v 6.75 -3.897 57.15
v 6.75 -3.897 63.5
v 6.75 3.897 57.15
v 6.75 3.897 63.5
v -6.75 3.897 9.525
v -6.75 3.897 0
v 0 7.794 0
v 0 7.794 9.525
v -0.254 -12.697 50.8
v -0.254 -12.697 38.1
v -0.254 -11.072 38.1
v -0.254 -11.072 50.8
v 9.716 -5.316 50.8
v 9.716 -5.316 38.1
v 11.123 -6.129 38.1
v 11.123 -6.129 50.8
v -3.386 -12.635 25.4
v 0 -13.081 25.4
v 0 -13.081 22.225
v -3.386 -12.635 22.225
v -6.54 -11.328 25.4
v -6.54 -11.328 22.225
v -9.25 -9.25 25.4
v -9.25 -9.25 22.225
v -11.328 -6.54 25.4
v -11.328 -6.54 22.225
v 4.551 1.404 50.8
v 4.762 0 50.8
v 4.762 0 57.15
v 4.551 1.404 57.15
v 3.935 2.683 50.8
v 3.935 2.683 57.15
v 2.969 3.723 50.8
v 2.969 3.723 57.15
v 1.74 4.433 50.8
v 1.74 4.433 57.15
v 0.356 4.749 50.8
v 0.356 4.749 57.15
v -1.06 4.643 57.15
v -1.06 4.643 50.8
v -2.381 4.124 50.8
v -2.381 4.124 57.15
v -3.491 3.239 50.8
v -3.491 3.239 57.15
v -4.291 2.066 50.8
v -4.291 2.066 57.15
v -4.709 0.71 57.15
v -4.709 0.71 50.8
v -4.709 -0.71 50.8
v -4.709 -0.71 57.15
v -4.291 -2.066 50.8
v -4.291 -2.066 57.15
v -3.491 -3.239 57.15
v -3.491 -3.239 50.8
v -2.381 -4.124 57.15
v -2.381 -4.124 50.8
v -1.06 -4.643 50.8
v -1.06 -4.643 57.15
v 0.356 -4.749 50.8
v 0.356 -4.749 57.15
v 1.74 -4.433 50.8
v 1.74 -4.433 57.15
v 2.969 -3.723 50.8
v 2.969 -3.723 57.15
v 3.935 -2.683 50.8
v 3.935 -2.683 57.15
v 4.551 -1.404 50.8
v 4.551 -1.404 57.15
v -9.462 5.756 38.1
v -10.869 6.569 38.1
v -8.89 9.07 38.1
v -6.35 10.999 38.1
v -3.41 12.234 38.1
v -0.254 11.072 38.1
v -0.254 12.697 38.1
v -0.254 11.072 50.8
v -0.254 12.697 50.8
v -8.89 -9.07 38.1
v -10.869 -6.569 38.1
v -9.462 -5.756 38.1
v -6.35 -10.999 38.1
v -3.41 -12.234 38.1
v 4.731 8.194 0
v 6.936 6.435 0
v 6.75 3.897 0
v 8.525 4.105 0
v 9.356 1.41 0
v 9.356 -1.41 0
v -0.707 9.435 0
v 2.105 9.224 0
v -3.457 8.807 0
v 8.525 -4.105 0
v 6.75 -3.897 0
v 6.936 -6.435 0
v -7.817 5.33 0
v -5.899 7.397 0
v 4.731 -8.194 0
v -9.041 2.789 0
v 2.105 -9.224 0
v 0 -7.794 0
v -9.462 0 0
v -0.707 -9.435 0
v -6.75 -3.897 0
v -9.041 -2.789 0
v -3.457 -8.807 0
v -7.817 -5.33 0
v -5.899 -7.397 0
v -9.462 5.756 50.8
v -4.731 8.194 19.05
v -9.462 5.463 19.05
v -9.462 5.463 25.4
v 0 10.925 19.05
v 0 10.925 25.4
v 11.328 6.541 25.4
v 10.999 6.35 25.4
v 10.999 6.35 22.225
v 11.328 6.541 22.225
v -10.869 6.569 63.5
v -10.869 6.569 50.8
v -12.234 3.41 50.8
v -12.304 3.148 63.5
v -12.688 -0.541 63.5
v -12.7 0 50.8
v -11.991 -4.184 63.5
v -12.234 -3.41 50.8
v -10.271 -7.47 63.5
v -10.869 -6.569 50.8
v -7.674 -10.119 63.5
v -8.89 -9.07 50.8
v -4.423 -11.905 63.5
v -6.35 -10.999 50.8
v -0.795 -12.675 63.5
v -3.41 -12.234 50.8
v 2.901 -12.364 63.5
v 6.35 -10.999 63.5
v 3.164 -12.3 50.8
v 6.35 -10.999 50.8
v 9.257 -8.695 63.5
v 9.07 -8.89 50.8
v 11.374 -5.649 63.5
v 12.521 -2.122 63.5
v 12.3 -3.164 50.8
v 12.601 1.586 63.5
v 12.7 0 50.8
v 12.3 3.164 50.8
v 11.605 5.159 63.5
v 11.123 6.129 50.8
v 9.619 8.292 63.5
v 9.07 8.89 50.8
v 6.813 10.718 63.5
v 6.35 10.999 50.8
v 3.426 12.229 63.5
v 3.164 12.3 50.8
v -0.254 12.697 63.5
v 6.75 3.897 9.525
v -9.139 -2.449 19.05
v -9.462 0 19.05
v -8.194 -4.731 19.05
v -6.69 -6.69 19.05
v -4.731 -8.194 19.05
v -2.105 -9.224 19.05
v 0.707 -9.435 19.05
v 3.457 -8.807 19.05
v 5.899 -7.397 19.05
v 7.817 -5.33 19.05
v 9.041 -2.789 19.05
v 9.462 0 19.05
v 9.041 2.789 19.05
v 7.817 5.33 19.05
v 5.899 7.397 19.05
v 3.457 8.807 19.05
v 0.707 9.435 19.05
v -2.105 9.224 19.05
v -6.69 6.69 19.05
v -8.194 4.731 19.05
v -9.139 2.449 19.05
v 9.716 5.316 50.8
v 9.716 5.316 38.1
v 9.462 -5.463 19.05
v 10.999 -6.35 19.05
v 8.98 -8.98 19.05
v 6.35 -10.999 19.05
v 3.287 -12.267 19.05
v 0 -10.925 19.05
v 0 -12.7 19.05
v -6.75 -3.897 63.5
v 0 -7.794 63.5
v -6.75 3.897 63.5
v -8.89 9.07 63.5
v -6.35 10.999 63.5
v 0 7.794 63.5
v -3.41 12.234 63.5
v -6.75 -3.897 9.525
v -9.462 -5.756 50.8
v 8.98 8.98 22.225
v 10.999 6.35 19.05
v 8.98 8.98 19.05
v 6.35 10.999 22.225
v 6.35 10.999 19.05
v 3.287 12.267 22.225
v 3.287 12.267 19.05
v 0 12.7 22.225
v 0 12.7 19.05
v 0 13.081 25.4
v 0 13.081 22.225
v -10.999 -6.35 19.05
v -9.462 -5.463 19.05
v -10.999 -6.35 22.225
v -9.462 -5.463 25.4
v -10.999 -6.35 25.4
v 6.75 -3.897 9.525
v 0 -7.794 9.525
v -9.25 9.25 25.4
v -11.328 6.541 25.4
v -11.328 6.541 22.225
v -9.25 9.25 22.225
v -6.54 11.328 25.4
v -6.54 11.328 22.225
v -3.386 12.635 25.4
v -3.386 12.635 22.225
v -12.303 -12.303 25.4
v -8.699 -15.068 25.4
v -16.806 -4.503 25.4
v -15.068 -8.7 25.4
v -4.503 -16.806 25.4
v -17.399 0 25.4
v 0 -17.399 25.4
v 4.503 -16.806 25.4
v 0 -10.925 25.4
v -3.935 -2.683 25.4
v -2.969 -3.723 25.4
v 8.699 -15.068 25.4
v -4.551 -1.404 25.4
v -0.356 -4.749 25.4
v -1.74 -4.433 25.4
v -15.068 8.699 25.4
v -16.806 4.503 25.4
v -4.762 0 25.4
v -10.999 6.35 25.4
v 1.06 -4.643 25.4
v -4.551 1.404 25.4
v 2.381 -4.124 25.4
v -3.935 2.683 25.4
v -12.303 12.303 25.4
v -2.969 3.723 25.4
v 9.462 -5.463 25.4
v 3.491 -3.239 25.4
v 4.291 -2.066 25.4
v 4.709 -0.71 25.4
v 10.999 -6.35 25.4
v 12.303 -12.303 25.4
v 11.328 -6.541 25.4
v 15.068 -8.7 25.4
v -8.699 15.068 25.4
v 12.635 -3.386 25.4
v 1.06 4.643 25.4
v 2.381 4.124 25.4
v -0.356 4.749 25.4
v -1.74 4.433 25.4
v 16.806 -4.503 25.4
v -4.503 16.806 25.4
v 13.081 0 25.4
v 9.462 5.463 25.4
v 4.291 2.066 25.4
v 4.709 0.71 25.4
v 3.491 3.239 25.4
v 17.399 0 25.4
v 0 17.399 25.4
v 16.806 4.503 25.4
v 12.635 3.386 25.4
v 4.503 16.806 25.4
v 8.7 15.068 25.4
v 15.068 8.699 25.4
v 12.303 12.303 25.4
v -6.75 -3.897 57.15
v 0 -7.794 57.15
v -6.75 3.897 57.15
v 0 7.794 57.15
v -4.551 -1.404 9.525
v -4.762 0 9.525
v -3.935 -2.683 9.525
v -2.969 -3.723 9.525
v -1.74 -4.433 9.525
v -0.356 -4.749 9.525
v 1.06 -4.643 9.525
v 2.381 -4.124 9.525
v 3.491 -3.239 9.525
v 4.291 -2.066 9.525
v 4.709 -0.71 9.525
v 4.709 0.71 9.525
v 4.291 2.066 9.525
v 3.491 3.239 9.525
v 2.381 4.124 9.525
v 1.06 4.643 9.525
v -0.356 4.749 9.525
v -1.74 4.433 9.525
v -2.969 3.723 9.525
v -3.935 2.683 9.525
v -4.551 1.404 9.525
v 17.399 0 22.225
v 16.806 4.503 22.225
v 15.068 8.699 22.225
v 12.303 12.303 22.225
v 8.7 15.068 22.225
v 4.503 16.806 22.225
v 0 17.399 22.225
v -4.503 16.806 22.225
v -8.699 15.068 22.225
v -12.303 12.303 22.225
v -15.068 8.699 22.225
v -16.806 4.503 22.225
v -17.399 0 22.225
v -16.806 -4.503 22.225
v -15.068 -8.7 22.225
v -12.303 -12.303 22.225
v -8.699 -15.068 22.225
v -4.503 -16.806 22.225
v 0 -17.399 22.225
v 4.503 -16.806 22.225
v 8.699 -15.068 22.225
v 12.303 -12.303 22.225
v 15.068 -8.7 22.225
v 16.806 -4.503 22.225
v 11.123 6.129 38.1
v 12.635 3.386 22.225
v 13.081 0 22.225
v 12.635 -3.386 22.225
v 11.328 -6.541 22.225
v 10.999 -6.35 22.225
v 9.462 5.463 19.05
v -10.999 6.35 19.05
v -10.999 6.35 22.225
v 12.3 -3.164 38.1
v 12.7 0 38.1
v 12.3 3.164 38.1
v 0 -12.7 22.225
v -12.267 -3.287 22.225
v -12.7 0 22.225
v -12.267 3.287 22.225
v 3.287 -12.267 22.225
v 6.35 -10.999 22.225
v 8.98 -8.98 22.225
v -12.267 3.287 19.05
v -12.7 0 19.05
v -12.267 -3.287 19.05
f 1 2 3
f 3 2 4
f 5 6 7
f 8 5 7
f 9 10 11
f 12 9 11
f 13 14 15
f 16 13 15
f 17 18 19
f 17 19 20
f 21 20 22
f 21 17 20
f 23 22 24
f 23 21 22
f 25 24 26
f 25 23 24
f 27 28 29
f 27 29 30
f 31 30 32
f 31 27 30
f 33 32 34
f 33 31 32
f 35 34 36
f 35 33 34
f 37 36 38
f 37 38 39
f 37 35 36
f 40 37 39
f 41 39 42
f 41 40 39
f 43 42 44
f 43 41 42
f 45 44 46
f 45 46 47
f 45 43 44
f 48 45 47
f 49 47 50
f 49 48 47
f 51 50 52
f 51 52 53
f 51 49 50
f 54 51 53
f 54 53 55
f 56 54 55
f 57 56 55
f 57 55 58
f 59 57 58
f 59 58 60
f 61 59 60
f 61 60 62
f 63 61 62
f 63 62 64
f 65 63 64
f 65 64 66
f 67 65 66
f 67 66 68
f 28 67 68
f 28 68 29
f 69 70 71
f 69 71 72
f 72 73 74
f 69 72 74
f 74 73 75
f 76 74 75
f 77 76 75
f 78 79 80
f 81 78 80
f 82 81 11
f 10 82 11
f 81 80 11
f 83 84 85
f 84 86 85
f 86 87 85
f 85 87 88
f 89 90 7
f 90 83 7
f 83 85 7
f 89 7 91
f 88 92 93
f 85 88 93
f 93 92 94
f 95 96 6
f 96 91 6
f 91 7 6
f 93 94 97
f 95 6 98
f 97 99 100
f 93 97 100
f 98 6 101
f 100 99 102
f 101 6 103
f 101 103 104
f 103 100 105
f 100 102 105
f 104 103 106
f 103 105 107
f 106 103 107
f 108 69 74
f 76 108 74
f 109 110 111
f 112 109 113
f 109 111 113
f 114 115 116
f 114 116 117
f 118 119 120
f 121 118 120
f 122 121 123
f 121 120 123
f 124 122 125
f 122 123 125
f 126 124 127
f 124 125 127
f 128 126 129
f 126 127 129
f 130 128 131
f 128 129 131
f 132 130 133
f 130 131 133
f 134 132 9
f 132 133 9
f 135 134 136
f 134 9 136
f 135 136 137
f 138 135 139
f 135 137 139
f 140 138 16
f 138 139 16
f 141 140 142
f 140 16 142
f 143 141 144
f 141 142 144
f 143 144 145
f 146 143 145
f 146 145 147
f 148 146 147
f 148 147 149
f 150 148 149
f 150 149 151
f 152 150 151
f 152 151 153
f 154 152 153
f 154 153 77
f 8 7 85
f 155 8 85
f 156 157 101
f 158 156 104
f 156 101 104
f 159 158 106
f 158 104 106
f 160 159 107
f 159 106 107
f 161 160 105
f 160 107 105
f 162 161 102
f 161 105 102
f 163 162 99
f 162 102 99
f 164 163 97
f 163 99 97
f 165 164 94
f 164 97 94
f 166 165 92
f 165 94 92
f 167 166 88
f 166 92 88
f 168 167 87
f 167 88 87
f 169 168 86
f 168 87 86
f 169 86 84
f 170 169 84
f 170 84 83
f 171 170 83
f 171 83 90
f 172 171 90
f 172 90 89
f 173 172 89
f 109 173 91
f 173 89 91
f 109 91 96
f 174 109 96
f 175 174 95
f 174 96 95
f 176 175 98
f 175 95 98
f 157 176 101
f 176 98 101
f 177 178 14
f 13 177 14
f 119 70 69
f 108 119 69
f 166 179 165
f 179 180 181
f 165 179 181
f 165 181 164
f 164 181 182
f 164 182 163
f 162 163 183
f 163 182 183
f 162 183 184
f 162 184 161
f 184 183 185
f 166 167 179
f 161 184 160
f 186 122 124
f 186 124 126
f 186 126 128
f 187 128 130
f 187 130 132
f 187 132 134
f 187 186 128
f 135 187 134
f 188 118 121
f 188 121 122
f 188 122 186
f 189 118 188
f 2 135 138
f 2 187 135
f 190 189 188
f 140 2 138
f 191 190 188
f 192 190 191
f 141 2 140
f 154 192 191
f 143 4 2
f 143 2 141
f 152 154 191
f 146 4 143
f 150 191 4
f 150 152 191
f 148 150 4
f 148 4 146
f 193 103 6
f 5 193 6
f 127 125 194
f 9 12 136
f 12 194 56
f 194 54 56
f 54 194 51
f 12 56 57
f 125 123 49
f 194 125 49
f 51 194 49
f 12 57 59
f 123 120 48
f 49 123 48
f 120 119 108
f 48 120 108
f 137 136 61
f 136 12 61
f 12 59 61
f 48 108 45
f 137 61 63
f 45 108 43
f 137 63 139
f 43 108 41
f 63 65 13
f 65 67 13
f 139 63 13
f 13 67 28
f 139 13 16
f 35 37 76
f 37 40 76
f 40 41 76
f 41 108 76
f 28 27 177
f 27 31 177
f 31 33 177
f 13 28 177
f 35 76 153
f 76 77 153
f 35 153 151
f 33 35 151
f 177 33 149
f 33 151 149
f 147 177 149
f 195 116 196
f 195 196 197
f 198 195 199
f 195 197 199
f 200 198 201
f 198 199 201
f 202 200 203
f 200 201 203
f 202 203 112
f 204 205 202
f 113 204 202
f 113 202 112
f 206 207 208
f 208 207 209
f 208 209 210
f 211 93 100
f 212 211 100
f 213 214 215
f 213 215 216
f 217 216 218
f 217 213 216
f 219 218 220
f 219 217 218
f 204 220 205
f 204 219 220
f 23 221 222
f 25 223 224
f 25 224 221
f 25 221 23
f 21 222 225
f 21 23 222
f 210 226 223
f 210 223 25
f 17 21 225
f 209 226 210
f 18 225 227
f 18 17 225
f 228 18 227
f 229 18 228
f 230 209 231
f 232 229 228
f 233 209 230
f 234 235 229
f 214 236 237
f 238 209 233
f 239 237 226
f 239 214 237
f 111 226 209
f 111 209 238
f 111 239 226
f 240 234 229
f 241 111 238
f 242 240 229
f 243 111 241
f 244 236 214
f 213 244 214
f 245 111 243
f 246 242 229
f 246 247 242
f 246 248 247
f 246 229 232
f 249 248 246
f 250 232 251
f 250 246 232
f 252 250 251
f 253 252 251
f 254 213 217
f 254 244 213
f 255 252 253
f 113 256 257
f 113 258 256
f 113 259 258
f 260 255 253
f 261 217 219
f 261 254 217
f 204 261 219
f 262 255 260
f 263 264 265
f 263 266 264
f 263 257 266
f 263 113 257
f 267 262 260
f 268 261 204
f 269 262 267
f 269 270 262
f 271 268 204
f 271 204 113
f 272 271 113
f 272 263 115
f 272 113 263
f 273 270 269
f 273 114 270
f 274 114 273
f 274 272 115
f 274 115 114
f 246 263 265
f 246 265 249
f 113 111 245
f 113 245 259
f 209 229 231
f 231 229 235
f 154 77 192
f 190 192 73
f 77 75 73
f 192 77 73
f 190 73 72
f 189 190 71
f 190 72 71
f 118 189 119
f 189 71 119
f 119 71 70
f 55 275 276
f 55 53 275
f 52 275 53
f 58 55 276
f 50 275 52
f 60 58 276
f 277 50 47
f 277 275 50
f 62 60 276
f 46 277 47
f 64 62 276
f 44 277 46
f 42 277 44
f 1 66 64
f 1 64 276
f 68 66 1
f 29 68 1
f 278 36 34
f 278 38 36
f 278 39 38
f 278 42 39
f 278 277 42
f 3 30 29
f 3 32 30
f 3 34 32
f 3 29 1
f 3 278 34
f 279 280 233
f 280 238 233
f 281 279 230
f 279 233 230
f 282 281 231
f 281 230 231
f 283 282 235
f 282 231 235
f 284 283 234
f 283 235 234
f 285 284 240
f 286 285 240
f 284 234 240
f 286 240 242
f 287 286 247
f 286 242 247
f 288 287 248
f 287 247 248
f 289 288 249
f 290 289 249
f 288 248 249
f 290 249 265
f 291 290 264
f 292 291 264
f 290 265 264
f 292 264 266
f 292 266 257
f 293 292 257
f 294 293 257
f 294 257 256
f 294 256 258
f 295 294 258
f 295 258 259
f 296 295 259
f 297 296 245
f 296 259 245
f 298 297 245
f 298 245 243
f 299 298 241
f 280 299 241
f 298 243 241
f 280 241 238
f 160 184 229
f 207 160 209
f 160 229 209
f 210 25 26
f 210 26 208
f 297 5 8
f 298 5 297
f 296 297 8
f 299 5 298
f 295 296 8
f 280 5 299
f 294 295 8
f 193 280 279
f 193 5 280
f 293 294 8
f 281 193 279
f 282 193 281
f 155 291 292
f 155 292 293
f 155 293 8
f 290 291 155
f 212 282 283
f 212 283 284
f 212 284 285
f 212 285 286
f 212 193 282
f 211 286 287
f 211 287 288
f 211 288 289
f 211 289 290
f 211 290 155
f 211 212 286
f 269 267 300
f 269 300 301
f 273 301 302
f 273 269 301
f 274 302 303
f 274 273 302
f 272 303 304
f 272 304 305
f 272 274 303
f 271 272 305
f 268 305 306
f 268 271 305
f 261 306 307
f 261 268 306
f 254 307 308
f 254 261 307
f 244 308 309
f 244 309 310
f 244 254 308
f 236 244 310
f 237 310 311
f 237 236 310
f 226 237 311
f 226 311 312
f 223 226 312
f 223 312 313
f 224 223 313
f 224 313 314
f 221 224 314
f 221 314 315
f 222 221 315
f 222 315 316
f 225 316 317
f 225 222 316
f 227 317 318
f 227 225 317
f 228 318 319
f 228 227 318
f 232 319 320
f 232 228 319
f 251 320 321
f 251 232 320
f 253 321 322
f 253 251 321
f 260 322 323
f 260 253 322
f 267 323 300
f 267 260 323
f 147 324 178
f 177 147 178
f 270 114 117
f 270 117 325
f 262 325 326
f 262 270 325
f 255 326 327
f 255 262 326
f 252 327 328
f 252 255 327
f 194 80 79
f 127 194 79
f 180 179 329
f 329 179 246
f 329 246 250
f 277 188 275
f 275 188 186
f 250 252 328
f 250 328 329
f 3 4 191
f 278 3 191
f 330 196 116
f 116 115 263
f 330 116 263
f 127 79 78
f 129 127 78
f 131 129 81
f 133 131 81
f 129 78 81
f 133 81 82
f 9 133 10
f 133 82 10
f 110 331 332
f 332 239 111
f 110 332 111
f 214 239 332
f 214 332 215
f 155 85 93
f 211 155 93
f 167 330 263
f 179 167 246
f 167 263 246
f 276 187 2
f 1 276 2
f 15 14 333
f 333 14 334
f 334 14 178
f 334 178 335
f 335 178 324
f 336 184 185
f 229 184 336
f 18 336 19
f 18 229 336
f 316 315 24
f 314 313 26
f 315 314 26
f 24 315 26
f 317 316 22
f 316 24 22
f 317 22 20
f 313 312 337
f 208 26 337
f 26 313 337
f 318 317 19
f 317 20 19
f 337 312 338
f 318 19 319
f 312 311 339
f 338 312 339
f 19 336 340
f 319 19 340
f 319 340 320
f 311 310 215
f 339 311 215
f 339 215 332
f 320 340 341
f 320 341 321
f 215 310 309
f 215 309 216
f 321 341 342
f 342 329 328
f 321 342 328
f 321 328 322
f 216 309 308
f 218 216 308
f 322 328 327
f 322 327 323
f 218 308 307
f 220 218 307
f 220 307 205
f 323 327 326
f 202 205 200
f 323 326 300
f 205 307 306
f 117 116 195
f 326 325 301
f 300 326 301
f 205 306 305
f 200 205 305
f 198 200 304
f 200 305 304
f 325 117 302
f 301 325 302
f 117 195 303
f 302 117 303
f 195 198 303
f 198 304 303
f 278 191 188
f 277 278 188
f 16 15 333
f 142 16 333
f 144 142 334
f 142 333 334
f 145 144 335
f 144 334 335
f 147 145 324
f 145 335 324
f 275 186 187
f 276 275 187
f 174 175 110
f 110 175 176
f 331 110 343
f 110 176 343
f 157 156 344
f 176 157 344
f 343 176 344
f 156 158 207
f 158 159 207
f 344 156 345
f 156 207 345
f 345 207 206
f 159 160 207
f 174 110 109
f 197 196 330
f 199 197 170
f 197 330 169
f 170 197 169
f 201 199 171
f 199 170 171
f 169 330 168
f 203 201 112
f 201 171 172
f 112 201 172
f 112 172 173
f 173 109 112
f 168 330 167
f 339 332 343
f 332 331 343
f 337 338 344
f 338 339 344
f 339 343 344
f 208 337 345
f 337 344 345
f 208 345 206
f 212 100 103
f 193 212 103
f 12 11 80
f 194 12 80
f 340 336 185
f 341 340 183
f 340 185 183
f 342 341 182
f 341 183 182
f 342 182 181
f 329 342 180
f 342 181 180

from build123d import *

# Parameters (mm, degrees)
F2_R      = 4.7625
F3_DEPTH  = 9.525
F5_DEPTH  = 25.4
F8_DEPTH  = 12.7
F9_R      = 4.7625
F10_DEPTH = 12.7
F11_R     = 4.7625
F12_DEPTH = 6.35
F13_R     = 17.399
F14_DEPTH = 3.175


with BuildPart() as f1:
    # F0 (on Front) → F1 (revolve)
    with BuildSketch(Plane.XZ):
        Polygon((-9.4615, 0), (-4.7625, 0), (-4.7625, 6.35), (-4.7625, 25.4), (-12.7, 25.4), (-12.7, 19.05), (-9.4615, 19.05), align=None)
    revolve(axis=Axis((0, 0, 10.2228309714), (0, 0, 1)))

    # F2 (on face) → F3 (cut)
    with BuildSketch(Plane(origin=(0, 0, 0), x_dir=(1, 0, 0), z_dir=(0, 0, -1))):
        Polygon((6.75, -3.897114317), (6.75, 3.897114317), (0, 7.7942286341), (-6.75, 3.897114317), (-6.75, -3.897114317), (0, -7.7942286341), align=None)
        Circle(F2_R, mode=Mode.SUBTRACT)
    extrude(amount=-F3_DEPTH, mode=Mode.SUBTRACT)

    # F4 (on face) → F5 (cut)
    with BuildSketch(Plane.XY.offset(25.4)):
        with BuildLine():
            Line((-4.73075, 8.1938993579), (0, 10.9251991439))
            Line((0, 10.9251991439), (0, 12.7))
            ThreePointArc((0, 12.7), (-6.35, 10.9985226281), (-10.9985226281, 6.35))
            Line((-10.9985226281, 6.35), (-9.4615, 5.4625995719))
            Line((-9.4615, 5.4625995719), (-4.73075, 8.1938993579))
        make_face()
        with BuildLine():
            Line((-9.4615, -5.4625995719), (-10.9985226281, -6.35))
            ThreePointArc((-10.9985226281, -6.35), (-6.35, -10.9985226281), (0, -12.7))
            Line((0, -12.7), (0, -10.9251991439))
            Line((0, -10.9251991439), (-4.73075, -8.1938993579))
            Line((-4.73075, -8.1938993579), (-9.4615, -5.4625995719))
        make_face()
        with BuildLine():
            ThreePointArc((12.7, 0), (12.2672579939, 3.2870018728), (10.9985226281, 6.35))
            Line((10.9985226281, 6.35), (9.4615, 5.4625995719))
            Line((9.4615, 5.4625995719), (9.4615, 0))
            Line((9.4615, 0), (9.4615, -5.4625995719))
            Line((9.4615, -5.4625995719), (10.9985226281, -6.35))
            ThreePointArc((10.9985226281, -6.35), (12.2672579939, -3.2870018728), (12.7, 0))
        make_face()
    extrude(amount=-F5_DEPTH, mode=Mode.SUBTRACT)

    # F13 (on face) → F14 (join)
    with BuildSketch(Plane.XY.offset(25.4)):
        Circle(F13_R)
        with BuildLine():
            ThreePointArc((11.3284783069, 6.5405), (13.081, 0), (11.3284783069, -6.5405))
            Line((11.3284783069, -6.5405), (10.9985226281, -6.35))
            ThreePointArc((10.9985226281, -6.35), (6.35, -10.9985226281), (0, -12.7))
            Line((0, -12.7), (0, -13.081))
            ThreePointArc((0, -13.081), (-6.5405, -11.3284783069), (-11.3284783069, -6.5405))
            Line((-11.3284783069, -6.5405), (-10.9985226281, -6.35))
            ThreePointArc((-10.9985226281, -6.35), (-12.7, 0), (-10.9985226281, 6.35))
            Line((-10.9985226281, 6.35), (-11.3284783069, 6.5405))
            ThreePointArc((-11.3284783069, 6.5405), (-6.5405, 11.3284783069), (0, 13.081))
            Line((0, 13.081), (0, 12.7))
            ThreePointArc((0, 12.7), (6.35, 10.9985226281), (10.9985226281, 6.35))
            Line((10.9985226281, 6.35), (11.3284783069, 6.5405))
        make_face(mode=Mode.SUBTRACT)
    extrude(amount=-F14_DEPTH)


with BuildPart() as f8:
    # F7 (on offset) → F8 (new body)
    with BuildSketch(Plane.XY.offset(38.1)):
        with BuildLine():
            Line((-9.4615, 5.7558935087), (-0.254, 11.0718461122))
            Line((-0.254, 11.0718461122), (-0.254, 12.6974597459))
            ThreePointArc((-0.254, 12.6974597459), (-6.35, 10.9985226281), (-10.8693227035, 6.5687003255))
            Line((-10.8693227035, 6.5687003255), (-9.4615, 5.7558935087))
        make_face()
    extrude(amount=F8_DEPTH)



with BuildPart() as f8b:
    # F7 (on offset) → F8, piece 2 (new body)
    with BuildSketch(Plane.XY.offset(38.1)):
        with BuildLine():
            Line((11.1233227035, 6.1287594204), (9.7155, 5.3159526036))
            Line((9.7155, 5.3159526036), (9.7155, -5.3159526036))
            Line((9.7155, -5.3159526036), (11.1233227035, -6.1287594204))
            ThreePointArc((11.1233227035, -6.1287594204), (12.7, 0), (11.1233227035, 6.1287594204))
        make_face()
    extrude(amount=F8_DEPTH)


with BuildPart() as f8c:
    # F7 (on offset) → F8, piece 3 (new body)
    with BuildSketch(Plane.XY.offset(38.1)):
        with BuildLine():
            Line((-0.254, -12.6974597459), (-0.254, -11.0718461122))
            Line((-0.254, -11.0718461122), (-9.4615, -5.7558935087))
            Line((-9.4615, -5.7558935087), (-10.8693227035, -6.5687003255))
            ThreePointArc((-10.8693227035, -6.5687003255), (-6.35, -10.9985226281), (-0.254, -12.6974597459))
        make_face()
    extrude(amount=F8_DEPTH)


with BuildPart() as f8_1:
    add(f8.part)

    add(f8b.part)  # F10 merges F8b

    add(f8c.part)  # F10 merges F8c
    # F9 (on face) → F10 (join)
    with BuildSketch(Plane.XY.offset(50.8)):
        with BuildLine():
            ThreePointArc((-10.8693227035, 6.5687003255), (-3.4095162168, -12.2337728918), (12.7, 0))
            ThreePointArc((12.7, 0), (8.89, 9.0696141042), (-0.254, 12.6974597459))
            Line((-0.254, 12.6974597459), (-0.254, 11.0718461122))
            Line((-0.254, 11.0718461122), (-9.4615, 5.7558935087))
            Line((-9.4615, 5.7558935087), (-10.8693227035, 6.5687003255))
        make_face()
        Circle(F9_R, mode=Mode.SUBTRACT)
        with BuildLine():
            Line((-0.254, 11.0718461122), (-0.254, 12.6974597459))
            ThreePointArc((-0.254, 12.6974597459), (-6.35, 10.9985226281), (-10.8693227035, 6.5687003255))
            Line((-10.8693227035, 6.5687003255), (-9.4615, 5.7558935087))
            Line((-9.4615, 5.7558935087), (-0.254, 11.0718461122))
        make_face()
    extrude(amount=F10_DEPTH)

    # F11 (on face) → F12 (cut)
    with BuildSketch(Plane.XY.offset(63.5)):
        Polygon((6.75, 3.897114317), (0, 7.7942286341), (-6.75, 3.897114317), (-6.75, -3.897114317), (0, -7.7942286341), (6.75, -3.897114317), align=None)
        Circle(F11_R, mode=Mode.SUBTRACT)
    extrude(amount=-F12_DEPTH, mode=Mode.SUBTRACT)


solid = Compound([f1.part, f8_1.part])
